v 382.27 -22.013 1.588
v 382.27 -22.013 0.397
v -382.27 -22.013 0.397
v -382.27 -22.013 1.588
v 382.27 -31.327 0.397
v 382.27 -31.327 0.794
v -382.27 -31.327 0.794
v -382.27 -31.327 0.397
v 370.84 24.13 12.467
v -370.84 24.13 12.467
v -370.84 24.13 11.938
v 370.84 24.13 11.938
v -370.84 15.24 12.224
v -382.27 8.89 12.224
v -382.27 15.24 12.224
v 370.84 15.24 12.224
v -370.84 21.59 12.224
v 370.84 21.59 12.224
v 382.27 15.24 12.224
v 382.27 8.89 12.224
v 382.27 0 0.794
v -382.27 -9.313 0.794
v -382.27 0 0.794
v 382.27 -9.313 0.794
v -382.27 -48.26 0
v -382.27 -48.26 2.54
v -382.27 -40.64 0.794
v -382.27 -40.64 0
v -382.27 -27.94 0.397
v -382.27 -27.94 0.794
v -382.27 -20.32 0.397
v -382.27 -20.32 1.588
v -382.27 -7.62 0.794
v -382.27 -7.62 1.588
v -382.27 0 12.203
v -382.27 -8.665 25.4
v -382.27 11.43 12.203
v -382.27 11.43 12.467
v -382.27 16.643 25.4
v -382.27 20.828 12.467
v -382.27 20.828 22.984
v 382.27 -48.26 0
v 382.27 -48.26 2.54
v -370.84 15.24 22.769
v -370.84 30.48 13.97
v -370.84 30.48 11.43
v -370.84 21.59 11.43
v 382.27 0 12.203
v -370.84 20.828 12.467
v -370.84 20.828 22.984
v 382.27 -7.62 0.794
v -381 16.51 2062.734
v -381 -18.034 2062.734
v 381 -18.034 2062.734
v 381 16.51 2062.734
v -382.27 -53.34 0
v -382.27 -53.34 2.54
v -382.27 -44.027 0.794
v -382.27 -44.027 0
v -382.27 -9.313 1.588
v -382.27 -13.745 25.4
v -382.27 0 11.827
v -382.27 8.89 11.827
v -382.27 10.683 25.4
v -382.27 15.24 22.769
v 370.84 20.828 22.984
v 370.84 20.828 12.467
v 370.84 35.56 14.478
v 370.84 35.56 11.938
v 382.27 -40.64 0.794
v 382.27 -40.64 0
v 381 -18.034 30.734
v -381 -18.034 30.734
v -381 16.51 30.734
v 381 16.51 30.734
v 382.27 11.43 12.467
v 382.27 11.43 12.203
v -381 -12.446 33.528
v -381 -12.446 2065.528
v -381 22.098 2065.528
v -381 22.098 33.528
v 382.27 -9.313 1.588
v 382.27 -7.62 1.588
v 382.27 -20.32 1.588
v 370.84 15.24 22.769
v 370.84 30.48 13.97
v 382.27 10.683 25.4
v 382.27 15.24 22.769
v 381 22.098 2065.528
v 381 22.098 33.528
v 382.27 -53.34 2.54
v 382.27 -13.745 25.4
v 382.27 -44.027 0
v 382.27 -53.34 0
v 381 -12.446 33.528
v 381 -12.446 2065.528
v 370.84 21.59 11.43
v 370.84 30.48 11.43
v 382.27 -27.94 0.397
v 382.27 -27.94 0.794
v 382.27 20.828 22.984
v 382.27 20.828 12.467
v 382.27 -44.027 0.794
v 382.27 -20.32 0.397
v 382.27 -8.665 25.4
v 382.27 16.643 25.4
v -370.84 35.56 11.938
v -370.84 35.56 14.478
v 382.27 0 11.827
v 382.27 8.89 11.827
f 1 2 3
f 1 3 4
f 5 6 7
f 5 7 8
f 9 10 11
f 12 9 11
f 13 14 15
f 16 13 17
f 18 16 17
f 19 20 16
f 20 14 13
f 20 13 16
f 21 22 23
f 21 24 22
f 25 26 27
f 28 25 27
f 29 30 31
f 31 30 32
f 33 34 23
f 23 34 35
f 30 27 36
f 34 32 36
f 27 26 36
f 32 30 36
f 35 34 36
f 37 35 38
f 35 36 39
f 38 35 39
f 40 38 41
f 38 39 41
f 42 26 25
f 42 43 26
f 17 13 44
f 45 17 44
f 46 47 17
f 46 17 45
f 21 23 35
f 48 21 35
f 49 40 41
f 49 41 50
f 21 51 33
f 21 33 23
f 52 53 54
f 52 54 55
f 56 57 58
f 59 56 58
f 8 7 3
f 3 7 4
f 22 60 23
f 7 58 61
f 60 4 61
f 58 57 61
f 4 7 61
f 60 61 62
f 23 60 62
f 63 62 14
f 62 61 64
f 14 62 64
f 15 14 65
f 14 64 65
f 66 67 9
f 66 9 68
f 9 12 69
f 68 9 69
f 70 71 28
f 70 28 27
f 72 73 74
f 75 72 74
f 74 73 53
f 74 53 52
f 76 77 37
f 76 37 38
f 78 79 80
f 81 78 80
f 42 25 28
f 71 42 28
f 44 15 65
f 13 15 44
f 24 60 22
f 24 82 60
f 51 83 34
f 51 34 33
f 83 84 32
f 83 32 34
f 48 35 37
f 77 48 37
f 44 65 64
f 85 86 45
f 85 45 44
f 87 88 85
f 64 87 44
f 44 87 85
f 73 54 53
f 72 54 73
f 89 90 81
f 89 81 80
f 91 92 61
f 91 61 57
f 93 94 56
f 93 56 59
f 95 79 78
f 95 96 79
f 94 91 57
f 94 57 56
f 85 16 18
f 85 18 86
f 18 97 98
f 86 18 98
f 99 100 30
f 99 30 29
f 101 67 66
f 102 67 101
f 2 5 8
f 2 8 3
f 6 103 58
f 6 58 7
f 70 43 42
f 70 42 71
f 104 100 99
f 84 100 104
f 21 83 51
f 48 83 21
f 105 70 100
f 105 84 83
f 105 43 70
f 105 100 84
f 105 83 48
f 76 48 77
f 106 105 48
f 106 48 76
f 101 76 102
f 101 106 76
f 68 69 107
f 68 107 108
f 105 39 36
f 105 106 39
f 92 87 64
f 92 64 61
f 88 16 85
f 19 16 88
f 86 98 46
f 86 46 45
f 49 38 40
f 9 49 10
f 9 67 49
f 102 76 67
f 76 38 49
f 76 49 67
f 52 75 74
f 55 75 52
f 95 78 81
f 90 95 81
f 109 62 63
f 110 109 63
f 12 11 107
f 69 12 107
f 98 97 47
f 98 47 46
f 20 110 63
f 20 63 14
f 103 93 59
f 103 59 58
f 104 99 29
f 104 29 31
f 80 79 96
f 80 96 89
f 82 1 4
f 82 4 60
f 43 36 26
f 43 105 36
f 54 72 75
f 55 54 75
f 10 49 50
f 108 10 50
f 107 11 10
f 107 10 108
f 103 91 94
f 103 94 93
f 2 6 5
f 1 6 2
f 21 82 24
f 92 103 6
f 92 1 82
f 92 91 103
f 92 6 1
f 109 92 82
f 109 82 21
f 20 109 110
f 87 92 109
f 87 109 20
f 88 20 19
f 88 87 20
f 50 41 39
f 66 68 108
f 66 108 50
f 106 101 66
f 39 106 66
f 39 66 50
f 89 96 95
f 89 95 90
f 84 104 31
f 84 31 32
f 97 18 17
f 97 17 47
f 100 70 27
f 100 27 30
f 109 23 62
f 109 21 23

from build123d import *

# Parameters (mm, degrees)
F0_W      = 34.544
F0_H      = 4.318
F0_H_2    = 2027.682
F2_DEPTH  = 381
F1_W      = 34.544
F1_H      = 2027.682
F1_H_2    = 4.318
F3_DEPTH  = 381
F6_DEPTH  = 382.27
F7_DEPTH  = 382.27
F8_W      = 11.43
F8_H      = 53.34
F10_DEPTH = 2065.529
F9_W      = 11.43
F9_H      = 53.34
F11_DEPTH = 2065.529


with BuildPart() as f2:
    # F0 (on Right) → F2 (new body, symmetric)
    with BuildSketch(Plane.YZ):
        with Locations((-0.762, 32.893)):
            Rectangle(F0_W, F0_H)
        with Locations((-0.762, 1048.893)):
            Rectangle(F0_W, F0_H_2)
    extrude(amount=F2_DEPTH, both=True)


with BuildPart() as f3:
    # F1 (on Right) → F3 (new body, symmetric)
    with BuildSketch(Plane.YZ):
        with Locations((4.826, 1051.687)):
            Rectangle(F1_W, F1_H)
        with Locations((4.826, 35.687)):
            Rectangle(F1_W, F1_H_2)
    extrude(amount=F3_DEPTH, both=True)


with BuildPart() as f6:
    # F4 (on Right) → F6 (new body, symmetric)
    with BuildSketch(Plane.YZ):
        Polygon((0, 0.79375), (0, 11.826875), (8.89, 11.826875), (8.89, 12.22375), (21.59, 12.22375), (21.59, 11.43), (30.48, 11.43), (30.48, 13.97), (10.6826592695, 25.4), (-13.745318539, 25.4), (-53.34, 2.54), (-53.34, 0), (-44.0266666667, 0), (-44.0266666667, 0.79375), (-31.3266666667, 0.79375), (-31.3266666667, 0.396875), (-22.0133333333, 0.396875), (-22.0133333333, 1.5875), (-9.3133333333, 1.5875), (-9.3133333333, 0.79375), align=None)
    extrude(amount=F6_DEPTH, both=True)

    # F8 (on Top) → F10 (cut, through all)
    with BuildSketch(Plane.XY):
        with Locations((-376.555, 41.91)):
            Rectangle(F8_W, F8_H)
        with Locations((376.555, 41.91)):
            Rectangle(F8_W, F8_H)
    extrude(amount=F10_DEPTH, mode=Mode.SUBTRACT)


with BuildPart() as f7:
    # F5 (on Right) → F7 (new body, symmetric)
    with BuildSketch(Plane.YZ):
        Polygon((-48.26, 2.54), (-48.26, 0), (-40.64, 0), (-40.64, 0.79375), (-27.94, 0.79375), (-27.94, 0.396875), (-20.32, 0.396875), (-20.32, 1.5875), (-7.62, 1.5875), (-7.62, 0.79375), (0, 0.79375), (0, 12.2025833333), (11.43, 12.2025833333), (11.43, 12.4671666667), (24.13, 12.4671666667), (24.13, 11.938), (35.56, 11.938), (35.56, 14.478), (16.6425410797, 25.4), (-8.665318539, 25.4), align=None)
    extrude(amount=F7_DEPTH, both=True)

    # F9 (on Top) → F11 (cut, through all)
    with BuildSketch(Plane.XY):
        with Locations((-376.555, 47.498)):
            Rectangle(F9_W, F9_H)
        with Locations((376.555, 47.498)):
            Rectangle(F9_W, F9_H)
    extrude(amount=F11_DEPTH, mode=Mode.SUBTRACT)


solid = Compound([f2.part, f3.part, f6.part, f7.part])
